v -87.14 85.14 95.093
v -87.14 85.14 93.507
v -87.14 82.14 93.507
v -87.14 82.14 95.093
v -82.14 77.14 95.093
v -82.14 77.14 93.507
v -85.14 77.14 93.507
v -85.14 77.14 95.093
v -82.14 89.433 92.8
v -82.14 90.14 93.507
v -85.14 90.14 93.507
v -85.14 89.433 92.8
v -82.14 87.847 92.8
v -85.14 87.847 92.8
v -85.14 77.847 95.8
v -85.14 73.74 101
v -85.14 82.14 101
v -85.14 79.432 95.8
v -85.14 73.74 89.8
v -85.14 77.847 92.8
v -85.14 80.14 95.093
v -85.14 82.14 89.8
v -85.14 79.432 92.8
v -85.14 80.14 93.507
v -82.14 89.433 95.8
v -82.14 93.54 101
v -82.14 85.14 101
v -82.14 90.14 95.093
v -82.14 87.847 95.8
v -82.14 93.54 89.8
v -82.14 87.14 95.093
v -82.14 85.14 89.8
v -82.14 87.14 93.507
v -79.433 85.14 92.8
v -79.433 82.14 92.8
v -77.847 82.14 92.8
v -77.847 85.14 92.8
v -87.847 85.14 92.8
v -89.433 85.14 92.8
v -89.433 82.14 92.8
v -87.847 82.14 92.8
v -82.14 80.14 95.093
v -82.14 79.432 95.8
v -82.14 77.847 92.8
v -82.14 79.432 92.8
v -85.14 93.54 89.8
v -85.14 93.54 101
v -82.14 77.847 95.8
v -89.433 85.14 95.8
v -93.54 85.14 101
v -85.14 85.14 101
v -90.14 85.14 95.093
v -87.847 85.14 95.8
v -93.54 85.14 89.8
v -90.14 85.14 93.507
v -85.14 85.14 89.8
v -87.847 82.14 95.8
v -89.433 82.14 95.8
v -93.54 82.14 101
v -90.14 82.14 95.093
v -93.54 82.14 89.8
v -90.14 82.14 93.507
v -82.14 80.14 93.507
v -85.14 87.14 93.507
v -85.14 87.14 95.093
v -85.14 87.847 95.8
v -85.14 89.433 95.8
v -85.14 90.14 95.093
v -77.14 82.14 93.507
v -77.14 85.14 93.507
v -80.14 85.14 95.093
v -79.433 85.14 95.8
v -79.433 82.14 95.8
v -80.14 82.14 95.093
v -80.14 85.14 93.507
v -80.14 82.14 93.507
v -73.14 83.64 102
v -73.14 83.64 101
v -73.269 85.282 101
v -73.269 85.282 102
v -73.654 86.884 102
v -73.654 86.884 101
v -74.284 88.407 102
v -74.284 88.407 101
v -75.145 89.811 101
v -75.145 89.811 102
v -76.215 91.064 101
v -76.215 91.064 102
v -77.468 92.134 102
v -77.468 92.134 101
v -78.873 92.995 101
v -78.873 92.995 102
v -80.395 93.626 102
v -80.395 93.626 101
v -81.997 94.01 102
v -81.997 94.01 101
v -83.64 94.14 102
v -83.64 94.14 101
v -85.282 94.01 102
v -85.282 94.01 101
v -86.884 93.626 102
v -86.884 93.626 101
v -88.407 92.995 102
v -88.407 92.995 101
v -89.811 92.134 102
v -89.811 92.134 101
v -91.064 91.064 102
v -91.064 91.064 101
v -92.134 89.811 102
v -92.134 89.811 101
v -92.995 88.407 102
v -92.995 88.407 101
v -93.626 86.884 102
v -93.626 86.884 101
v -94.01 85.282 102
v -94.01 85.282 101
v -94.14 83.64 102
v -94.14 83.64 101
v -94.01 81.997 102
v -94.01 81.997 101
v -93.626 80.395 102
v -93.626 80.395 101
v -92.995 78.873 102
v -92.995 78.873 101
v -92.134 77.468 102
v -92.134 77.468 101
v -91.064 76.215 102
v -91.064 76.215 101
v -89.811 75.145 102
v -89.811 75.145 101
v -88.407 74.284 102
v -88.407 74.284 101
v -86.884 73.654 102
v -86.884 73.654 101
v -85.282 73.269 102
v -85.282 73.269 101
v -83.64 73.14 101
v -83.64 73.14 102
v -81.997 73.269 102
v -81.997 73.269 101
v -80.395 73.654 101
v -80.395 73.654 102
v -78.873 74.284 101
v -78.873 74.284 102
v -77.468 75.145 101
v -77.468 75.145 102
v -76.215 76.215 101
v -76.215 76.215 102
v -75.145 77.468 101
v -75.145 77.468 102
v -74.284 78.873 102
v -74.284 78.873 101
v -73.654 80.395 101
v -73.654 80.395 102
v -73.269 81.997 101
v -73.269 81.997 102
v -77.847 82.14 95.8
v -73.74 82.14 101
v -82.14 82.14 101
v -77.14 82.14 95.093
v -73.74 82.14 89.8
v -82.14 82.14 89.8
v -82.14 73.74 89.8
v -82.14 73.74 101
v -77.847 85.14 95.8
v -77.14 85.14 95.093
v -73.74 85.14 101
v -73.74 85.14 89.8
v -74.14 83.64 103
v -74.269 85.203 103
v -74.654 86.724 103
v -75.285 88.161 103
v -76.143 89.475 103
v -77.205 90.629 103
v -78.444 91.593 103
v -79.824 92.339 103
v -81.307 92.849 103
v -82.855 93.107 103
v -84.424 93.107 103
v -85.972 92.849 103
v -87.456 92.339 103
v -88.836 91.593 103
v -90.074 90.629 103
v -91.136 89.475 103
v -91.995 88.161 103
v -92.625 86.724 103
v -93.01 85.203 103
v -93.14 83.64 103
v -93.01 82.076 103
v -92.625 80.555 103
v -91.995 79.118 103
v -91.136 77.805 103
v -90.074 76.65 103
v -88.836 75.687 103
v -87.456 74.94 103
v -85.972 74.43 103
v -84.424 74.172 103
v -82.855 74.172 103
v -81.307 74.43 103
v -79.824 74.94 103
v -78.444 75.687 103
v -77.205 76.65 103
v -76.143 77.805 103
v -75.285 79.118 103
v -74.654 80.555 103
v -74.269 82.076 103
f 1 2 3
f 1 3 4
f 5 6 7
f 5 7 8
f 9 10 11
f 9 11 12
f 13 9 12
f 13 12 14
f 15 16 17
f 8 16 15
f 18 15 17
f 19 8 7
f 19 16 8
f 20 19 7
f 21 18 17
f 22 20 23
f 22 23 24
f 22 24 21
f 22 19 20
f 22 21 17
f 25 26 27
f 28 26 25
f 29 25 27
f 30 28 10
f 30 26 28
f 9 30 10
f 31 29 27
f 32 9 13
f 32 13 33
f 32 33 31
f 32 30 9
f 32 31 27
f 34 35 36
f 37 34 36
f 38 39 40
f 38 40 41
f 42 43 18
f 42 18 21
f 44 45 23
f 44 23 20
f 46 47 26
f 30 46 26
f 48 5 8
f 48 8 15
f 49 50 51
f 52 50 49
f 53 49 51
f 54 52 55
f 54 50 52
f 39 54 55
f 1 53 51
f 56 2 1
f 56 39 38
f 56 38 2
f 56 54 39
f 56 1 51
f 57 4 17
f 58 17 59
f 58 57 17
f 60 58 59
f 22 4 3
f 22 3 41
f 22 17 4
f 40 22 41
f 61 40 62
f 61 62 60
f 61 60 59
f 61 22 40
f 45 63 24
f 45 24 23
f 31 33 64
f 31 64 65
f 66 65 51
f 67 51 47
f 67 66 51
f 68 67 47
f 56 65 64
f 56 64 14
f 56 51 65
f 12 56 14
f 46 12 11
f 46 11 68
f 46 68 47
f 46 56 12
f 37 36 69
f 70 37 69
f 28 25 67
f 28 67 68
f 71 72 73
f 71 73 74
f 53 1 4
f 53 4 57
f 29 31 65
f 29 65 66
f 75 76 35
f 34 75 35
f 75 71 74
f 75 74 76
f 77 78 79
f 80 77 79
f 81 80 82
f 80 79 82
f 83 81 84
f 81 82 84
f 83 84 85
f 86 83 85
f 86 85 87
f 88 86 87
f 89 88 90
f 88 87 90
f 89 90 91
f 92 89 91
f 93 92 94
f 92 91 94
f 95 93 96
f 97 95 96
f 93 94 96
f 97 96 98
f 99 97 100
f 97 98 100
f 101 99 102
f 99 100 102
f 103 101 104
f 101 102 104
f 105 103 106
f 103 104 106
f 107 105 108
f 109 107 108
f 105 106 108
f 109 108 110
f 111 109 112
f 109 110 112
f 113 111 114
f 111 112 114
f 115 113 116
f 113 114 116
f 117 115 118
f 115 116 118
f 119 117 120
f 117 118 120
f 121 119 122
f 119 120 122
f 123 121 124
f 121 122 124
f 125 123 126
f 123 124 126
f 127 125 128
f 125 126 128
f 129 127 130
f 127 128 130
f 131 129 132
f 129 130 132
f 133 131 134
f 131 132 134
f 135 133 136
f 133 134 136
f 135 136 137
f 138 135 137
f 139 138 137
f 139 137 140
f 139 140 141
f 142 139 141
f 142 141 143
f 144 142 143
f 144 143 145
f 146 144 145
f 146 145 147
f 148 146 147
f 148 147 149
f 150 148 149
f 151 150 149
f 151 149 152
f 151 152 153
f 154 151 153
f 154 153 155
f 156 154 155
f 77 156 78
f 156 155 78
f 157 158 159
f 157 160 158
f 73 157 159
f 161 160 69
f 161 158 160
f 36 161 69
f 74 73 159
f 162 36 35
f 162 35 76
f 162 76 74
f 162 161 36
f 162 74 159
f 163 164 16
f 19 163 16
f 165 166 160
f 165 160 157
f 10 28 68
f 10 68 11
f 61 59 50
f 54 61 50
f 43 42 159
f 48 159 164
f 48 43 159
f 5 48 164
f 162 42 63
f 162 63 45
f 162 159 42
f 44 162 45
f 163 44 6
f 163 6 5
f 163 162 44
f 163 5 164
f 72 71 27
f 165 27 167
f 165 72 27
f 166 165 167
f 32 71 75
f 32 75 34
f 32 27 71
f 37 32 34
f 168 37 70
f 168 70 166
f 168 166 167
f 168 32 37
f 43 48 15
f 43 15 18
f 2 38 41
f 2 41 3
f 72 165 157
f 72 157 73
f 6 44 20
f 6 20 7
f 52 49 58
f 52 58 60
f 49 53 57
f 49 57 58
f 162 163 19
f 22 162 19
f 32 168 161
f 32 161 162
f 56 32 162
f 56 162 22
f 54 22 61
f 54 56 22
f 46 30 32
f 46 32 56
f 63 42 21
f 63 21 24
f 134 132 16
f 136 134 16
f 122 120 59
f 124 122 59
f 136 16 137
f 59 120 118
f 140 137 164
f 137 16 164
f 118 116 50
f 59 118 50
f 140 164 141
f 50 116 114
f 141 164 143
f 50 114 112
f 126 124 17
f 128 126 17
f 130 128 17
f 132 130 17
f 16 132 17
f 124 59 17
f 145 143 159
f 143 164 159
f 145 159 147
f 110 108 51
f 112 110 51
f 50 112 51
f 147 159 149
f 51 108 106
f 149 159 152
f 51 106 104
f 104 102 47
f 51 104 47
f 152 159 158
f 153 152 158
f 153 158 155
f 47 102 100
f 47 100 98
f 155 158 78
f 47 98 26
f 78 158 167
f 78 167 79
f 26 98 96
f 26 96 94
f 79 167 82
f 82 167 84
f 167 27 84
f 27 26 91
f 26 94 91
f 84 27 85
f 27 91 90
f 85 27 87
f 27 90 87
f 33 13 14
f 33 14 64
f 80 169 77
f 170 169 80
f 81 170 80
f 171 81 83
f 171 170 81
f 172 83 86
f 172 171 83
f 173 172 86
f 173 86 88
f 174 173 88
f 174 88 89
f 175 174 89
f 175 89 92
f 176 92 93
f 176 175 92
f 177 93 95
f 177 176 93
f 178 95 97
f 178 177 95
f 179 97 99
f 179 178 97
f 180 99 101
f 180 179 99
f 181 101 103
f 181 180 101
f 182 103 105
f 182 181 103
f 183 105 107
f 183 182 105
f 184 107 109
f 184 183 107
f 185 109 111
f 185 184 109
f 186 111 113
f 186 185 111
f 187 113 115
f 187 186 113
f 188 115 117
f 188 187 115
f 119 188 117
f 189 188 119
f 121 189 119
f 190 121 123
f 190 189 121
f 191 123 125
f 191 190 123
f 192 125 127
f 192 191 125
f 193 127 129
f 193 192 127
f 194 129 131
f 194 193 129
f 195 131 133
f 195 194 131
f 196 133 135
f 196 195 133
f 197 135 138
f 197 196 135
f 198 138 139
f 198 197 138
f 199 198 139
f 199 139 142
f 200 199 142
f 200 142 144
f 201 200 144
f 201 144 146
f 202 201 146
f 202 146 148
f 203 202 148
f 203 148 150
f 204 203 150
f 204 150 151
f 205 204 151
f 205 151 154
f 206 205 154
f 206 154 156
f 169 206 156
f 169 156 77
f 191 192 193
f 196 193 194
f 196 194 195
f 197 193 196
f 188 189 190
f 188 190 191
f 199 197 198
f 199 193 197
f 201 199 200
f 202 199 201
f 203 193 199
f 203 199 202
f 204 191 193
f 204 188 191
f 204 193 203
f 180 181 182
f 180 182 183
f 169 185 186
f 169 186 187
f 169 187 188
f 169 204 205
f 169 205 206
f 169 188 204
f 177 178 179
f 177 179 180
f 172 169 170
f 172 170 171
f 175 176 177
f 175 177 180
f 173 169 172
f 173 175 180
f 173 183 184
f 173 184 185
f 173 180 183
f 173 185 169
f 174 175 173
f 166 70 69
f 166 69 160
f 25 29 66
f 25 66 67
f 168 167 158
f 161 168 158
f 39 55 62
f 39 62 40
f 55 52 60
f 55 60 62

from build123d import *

# Parameters (mm, degrees)
PAD042_DEPTH    = 11.2
SKETCH075_R     = 10.5
PAD043_DEPTH    = 2
CHAMFER004_SIZE = 1
POCKET032_DEPTH = 12.001018
POCKET033_DEPTH = 12.001


with BuildPart() as part:
    # Sketch074 (on Face4 of Binder018) → Pad042 (new body)
    with BuildSketch(Plane.XY.offset(89.8)):
        Polygon((-85.13961, 93.539629), (-82.13961, 93.539629), (-82.13961, 85.139629), (-73.73961, 85.139629), (-73.73961, 82.139629), (-82.13961, 82.139592), (-82.13961, 73.739592), (-85.13961, 73.739592), (-85.13961, 82.139592), (-93.53961, 82.139592), (-93.53961, 85.139629), (-85.13961, 85.139629), align=None)
    extrude(amount=PAD042_DEPTH)

    # Sketch075 (on Face14 of Pad042) → Pad043 (join)
    with BuildSketch(Plane.XY.offset(101)):
        with Locations((-83.63961, 83.63961)):
            Circle(SKETCH075_R)
    extrude(amount=PAD043_DEPTH)

    # Chamfer004
    chamfer004_edges = [part.edges().sort_by_distance(p)[0] for p in [
        (-94.13961, 83.63961, 103),
    ]]
    chamfer(chamfer004_edges, length=CHAMFER004_SIZE)

    # Sketch076 (on Face6 of Chamfer004) → Pocket032 (cut, through all)
    with BuildSketch(Plane(origin=(0, 85.139629, 0), x_dir=(-1, 0, 0), z_dir=(0, 1, 0))):
        Polygon((77.846717, 95.8), (79.432503, 95.8), (80.13961, 95.092893), (80.13961, 93.507107), (79.432503, 92.8), (77.846717, 92.8), (77.13961, 93.507107), (77.13961, 95.092893), align=None)
        Polygon((87.13961, 95.092893), (87.846717, 95.8), (89.432504, 95.8), (90.13961, 95.092893), (90.13961, 93.507107), (89.432504, 92.8), (87.846717, 92.8), (87.13961, 93.507107), align=None)
    extrude(amount=-POCKET032_DEPTH, mode=Mode.SUBTRACT)

    # Sketch077 (on Face15 of Pocket032) → Pocket033 (cut, through all)
    with BuildSketch(Plane(origin=(-82.139609, -1e-06, 0), x_dir=(0, 1, 0), z_dir=(1, 0, 0))):
        Polygon((87.846736, 95.8), (89.432523, 95.8), (90.139629, 95.092893), (90.139629, 93.507107), (89.432523, 92.8), (87.846736, 92.8), (87.139629, 93.507107), (87.139629, 95.092893), align=None)
        Polygon((77.846699, 95.8), (79.432486, 95.8), (80.139593, 95.092893), (80.139593, 93.507107), (79.432486, 92.8), (77.846699, 92.8), (77.139593, 93.507107), (77.139593, 95.092893), align=None)
    extrude(amount=-POCKET033_DEPTH, mode=Mode.SUBTRACT)


solid = part.part
